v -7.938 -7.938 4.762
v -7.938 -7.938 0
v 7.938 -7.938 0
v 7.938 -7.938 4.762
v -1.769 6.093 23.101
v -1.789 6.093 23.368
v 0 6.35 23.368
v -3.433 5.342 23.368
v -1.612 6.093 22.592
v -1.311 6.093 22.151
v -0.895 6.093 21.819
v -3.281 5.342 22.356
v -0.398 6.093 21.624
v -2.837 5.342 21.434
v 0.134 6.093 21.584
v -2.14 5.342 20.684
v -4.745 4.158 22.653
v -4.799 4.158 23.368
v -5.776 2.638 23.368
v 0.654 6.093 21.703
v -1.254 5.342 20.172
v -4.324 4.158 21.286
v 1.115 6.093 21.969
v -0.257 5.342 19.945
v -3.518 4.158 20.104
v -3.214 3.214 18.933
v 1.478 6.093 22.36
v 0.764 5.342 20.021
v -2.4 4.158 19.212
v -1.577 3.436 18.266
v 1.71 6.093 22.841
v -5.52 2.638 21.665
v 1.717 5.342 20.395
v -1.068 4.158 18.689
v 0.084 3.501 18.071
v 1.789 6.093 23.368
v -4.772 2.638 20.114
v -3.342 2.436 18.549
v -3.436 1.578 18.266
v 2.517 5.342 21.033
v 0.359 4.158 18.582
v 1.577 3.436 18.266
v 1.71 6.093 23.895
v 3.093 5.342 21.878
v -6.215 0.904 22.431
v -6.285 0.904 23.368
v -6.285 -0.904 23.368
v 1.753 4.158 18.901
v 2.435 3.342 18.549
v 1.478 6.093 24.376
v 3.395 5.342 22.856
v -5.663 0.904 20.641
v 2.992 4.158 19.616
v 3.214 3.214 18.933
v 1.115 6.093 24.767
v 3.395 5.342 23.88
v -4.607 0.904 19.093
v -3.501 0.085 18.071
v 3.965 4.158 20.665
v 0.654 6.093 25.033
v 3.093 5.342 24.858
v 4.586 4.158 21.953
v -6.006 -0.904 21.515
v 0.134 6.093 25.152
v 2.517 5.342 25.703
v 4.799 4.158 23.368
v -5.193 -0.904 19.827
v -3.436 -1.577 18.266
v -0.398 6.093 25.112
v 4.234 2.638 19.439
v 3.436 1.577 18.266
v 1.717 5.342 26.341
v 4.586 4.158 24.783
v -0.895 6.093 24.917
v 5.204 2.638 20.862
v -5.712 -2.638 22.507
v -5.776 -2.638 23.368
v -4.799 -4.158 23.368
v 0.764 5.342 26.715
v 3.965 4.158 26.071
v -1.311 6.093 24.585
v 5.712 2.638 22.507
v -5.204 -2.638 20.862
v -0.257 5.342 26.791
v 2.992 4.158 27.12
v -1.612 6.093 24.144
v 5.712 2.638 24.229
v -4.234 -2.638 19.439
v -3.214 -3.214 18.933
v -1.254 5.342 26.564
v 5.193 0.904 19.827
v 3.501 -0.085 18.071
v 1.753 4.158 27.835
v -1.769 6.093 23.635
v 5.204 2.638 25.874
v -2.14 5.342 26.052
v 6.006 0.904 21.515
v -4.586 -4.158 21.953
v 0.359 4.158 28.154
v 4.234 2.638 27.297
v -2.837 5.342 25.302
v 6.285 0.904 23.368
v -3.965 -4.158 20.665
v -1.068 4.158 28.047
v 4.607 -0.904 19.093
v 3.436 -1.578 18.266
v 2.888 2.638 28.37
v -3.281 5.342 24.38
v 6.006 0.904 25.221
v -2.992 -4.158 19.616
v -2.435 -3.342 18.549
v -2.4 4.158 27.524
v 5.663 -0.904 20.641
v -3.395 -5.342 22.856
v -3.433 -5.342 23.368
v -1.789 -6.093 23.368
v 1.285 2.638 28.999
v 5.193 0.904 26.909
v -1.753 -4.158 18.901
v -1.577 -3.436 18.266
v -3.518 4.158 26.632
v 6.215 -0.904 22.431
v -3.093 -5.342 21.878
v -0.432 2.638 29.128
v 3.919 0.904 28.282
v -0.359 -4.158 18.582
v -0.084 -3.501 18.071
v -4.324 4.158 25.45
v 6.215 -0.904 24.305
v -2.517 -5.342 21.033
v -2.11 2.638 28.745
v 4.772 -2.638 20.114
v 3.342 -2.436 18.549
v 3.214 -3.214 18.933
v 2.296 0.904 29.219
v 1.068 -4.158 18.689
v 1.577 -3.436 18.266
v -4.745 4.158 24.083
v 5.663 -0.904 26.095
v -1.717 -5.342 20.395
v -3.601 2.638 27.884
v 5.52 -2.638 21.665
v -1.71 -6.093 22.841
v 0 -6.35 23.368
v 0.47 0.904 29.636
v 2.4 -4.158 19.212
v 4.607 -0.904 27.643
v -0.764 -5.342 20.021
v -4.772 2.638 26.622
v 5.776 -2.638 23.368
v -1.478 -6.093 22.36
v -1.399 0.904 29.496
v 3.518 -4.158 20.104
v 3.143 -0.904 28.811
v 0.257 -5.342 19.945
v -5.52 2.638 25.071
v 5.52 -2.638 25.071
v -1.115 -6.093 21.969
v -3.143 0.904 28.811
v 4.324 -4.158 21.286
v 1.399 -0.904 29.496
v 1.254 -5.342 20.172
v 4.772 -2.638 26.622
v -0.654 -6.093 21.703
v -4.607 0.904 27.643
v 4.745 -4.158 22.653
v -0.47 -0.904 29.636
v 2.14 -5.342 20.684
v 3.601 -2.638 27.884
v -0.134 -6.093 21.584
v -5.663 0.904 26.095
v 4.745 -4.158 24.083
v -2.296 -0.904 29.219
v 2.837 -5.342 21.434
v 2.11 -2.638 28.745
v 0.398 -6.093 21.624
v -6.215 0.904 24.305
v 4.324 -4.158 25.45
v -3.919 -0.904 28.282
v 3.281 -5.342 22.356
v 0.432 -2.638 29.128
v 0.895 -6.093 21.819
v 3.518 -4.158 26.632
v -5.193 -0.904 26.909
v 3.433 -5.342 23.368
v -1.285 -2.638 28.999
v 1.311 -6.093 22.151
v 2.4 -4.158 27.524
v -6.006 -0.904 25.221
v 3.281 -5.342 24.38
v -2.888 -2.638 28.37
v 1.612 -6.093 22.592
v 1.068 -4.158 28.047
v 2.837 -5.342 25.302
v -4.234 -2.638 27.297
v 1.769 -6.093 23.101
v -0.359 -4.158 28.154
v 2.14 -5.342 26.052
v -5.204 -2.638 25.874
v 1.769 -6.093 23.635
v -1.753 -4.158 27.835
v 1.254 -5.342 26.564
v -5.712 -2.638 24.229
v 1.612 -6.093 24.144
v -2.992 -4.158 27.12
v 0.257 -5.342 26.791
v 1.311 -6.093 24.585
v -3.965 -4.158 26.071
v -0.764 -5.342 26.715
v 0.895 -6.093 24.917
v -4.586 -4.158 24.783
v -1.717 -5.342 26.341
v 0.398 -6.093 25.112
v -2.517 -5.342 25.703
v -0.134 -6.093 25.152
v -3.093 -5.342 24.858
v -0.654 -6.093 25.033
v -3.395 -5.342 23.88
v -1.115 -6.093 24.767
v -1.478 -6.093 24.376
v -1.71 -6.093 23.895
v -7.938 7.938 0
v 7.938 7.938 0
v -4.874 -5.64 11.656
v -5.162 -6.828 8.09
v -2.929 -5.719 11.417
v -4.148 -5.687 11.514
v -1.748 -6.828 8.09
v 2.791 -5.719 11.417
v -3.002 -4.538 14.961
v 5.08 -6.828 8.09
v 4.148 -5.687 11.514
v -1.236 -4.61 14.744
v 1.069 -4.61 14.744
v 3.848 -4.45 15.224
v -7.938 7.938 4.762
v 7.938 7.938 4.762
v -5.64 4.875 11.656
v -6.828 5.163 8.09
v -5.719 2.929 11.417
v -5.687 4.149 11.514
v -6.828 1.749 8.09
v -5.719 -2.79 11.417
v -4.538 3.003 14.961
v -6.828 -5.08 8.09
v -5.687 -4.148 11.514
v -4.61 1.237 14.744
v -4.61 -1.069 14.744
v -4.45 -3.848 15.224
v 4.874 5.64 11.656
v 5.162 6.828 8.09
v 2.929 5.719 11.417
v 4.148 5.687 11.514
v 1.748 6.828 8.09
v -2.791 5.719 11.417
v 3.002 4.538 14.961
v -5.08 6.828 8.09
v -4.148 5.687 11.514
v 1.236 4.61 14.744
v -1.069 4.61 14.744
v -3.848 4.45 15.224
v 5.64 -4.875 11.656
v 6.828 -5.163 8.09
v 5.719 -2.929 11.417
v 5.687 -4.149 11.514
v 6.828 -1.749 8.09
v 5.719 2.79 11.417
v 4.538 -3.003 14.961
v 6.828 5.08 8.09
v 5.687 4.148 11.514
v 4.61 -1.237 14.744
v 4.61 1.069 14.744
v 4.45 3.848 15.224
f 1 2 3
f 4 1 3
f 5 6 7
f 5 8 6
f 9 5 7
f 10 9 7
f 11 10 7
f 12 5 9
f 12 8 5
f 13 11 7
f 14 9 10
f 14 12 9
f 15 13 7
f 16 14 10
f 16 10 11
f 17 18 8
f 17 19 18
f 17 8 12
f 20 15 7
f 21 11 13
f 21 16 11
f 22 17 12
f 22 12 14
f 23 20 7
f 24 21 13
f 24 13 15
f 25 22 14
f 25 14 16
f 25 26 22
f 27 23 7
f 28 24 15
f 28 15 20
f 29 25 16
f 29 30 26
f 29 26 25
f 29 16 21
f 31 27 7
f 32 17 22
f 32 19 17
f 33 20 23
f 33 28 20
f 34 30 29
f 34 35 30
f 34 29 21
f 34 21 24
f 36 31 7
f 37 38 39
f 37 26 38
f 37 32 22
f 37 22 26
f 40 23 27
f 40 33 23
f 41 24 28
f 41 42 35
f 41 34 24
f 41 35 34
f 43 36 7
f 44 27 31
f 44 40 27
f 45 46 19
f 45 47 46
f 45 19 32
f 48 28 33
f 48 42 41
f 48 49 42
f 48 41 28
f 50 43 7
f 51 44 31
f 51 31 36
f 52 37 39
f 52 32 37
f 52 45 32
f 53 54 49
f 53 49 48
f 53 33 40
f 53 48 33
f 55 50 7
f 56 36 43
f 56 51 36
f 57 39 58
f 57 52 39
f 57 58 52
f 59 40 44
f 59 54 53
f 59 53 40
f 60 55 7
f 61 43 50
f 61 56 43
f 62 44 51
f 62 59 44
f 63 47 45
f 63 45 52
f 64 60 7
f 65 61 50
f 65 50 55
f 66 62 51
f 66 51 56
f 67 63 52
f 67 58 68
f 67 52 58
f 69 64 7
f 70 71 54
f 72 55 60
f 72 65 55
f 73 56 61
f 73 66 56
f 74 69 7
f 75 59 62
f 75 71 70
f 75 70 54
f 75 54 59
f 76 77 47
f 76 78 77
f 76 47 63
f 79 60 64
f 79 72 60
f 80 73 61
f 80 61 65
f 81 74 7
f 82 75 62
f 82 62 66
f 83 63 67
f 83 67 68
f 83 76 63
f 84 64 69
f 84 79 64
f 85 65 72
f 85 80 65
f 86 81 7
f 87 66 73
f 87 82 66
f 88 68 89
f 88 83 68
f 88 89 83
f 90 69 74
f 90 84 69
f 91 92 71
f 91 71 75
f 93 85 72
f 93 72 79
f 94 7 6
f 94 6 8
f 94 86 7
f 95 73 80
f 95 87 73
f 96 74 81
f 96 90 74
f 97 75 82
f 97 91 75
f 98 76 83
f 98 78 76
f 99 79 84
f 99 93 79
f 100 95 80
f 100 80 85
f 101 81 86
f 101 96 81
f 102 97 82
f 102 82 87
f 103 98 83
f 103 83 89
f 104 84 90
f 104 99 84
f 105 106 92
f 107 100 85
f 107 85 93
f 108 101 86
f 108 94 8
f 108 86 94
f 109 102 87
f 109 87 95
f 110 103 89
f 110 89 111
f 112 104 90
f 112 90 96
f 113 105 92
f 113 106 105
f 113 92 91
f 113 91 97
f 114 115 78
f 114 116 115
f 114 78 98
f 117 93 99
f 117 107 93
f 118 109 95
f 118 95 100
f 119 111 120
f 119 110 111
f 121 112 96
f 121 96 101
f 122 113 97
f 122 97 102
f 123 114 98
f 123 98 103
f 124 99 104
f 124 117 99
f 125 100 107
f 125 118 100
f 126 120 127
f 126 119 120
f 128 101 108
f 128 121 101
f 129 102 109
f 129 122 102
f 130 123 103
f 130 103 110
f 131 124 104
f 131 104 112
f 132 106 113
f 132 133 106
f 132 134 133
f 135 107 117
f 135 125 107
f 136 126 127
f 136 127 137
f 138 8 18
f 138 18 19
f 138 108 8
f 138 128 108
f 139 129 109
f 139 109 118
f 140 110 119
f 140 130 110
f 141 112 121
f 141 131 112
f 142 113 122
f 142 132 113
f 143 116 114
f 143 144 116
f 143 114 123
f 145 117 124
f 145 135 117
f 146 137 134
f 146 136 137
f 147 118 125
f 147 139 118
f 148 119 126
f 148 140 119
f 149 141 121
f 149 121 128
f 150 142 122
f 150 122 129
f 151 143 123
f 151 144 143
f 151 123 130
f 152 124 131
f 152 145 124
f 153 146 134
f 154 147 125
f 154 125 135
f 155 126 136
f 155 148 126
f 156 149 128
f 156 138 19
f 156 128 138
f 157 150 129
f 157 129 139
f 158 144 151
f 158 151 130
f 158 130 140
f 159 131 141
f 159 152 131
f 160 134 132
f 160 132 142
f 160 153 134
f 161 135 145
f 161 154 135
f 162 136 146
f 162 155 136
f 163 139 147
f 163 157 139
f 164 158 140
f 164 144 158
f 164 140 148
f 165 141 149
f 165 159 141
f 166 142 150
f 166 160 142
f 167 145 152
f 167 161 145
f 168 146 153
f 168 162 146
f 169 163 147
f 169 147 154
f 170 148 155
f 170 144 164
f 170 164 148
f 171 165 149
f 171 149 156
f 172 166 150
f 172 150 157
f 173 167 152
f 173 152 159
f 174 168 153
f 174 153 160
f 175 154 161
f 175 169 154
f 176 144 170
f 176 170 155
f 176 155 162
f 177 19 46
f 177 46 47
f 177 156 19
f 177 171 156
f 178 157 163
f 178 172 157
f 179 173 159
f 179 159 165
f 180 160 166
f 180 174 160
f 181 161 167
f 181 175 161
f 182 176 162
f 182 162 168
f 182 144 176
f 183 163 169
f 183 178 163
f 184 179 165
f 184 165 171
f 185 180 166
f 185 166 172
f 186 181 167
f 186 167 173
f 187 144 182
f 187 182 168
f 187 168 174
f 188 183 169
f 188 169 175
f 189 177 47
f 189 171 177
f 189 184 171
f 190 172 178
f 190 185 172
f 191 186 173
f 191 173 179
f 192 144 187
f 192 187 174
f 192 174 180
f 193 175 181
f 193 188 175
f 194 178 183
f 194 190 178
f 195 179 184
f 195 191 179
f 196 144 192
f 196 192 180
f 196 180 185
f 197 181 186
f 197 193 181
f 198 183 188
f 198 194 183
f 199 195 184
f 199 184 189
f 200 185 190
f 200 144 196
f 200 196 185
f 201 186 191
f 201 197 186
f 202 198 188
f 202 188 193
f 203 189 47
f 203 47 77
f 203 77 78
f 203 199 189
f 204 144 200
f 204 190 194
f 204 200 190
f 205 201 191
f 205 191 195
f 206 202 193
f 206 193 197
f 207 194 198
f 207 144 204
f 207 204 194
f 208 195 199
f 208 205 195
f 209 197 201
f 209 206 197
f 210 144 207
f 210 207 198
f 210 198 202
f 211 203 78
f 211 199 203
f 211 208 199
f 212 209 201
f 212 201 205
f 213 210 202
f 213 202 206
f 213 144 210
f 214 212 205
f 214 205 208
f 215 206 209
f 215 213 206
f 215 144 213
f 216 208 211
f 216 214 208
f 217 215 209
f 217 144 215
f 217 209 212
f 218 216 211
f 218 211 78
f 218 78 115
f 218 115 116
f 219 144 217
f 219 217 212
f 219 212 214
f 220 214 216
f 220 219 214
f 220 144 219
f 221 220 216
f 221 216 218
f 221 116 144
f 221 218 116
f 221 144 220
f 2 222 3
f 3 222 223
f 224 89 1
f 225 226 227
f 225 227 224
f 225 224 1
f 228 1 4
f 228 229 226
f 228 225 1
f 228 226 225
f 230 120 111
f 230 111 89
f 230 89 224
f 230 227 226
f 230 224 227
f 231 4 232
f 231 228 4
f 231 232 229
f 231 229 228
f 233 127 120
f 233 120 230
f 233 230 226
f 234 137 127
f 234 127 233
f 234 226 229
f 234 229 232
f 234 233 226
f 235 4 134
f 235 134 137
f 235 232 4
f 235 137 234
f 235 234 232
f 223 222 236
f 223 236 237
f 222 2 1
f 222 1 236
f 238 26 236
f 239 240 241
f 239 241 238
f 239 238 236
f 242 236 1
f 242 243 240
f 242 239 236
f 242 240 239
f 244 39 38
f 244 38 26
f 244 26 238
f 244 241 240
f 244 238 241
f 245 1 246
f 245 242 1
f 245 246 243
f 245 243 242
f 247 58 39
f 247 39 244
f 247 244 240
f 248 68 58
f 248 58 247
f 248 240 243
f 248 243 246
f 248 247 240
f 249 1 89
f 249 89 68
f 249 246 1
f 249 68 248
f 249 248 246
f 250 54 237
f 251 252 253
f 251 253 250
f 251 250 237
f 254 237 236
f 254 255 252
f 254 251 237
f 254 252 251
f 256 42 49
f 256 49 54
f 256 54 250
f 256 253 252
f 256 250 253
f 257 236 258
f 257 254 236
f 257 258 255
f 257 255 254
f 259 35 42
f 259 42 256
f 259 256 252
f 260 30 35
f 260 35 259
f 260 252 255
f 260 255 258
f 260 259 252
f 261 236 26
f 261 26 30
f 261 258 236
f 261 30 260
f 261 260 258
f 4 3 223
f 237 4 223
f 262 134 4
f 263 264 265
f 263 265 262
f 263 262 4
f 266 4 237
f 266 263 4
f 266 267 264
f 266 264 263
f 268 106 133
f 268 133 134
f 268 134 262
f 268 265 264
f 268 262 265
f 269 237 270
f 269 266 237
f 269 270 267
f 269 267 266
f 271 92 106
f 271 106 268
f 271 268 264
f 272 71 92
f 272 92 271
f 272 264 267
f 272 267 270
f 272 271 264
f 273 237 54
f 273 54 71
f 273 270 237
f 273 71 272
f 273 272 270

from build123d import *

# Parameters (mm, degrees)
F0_W      = 15.875
F0_H      = 15.875
F1_DEPTH  = 4.7625
F1_FACE_W = 15.875
F1_FACE_H = 15.875
F3_W      = 6.35
F3_H      = 6.35


with BuildPart() as f1:
    # F0 (on Top) → F1 (new body)
    with BuildSketch(Plane.XY):
        Rectangle(F0_W, F0_H)
    extrude(amount=F1_DEPTH)

    # F1_face (on face) → F4 section 0
    with BuildSketch(Plane.XY.offset(4.7625)):
        Rectangle(F1_FACE_W, F1_FACE_H)
    # F3 (on offset) → F4 section 1
    with BuildSketch(Plane.XY.offset(19.05)):
        Rectangle(F3_W, F3_H)
    loft()

    # F6 (on offset) → F7 (revolve)
    with BuildSketch(Plane.XY.offset(23.368)):
        with BuildLine():
            Line((0, -6.35), (0, 6.35))
            ThreePointArc((0, 6.35), (-6.35, 0), (0, -6.35))
        make_face()
    revolve(axis=Axis((0, 0, 23.368), (0, -1, 0)))


solid = f1.part
